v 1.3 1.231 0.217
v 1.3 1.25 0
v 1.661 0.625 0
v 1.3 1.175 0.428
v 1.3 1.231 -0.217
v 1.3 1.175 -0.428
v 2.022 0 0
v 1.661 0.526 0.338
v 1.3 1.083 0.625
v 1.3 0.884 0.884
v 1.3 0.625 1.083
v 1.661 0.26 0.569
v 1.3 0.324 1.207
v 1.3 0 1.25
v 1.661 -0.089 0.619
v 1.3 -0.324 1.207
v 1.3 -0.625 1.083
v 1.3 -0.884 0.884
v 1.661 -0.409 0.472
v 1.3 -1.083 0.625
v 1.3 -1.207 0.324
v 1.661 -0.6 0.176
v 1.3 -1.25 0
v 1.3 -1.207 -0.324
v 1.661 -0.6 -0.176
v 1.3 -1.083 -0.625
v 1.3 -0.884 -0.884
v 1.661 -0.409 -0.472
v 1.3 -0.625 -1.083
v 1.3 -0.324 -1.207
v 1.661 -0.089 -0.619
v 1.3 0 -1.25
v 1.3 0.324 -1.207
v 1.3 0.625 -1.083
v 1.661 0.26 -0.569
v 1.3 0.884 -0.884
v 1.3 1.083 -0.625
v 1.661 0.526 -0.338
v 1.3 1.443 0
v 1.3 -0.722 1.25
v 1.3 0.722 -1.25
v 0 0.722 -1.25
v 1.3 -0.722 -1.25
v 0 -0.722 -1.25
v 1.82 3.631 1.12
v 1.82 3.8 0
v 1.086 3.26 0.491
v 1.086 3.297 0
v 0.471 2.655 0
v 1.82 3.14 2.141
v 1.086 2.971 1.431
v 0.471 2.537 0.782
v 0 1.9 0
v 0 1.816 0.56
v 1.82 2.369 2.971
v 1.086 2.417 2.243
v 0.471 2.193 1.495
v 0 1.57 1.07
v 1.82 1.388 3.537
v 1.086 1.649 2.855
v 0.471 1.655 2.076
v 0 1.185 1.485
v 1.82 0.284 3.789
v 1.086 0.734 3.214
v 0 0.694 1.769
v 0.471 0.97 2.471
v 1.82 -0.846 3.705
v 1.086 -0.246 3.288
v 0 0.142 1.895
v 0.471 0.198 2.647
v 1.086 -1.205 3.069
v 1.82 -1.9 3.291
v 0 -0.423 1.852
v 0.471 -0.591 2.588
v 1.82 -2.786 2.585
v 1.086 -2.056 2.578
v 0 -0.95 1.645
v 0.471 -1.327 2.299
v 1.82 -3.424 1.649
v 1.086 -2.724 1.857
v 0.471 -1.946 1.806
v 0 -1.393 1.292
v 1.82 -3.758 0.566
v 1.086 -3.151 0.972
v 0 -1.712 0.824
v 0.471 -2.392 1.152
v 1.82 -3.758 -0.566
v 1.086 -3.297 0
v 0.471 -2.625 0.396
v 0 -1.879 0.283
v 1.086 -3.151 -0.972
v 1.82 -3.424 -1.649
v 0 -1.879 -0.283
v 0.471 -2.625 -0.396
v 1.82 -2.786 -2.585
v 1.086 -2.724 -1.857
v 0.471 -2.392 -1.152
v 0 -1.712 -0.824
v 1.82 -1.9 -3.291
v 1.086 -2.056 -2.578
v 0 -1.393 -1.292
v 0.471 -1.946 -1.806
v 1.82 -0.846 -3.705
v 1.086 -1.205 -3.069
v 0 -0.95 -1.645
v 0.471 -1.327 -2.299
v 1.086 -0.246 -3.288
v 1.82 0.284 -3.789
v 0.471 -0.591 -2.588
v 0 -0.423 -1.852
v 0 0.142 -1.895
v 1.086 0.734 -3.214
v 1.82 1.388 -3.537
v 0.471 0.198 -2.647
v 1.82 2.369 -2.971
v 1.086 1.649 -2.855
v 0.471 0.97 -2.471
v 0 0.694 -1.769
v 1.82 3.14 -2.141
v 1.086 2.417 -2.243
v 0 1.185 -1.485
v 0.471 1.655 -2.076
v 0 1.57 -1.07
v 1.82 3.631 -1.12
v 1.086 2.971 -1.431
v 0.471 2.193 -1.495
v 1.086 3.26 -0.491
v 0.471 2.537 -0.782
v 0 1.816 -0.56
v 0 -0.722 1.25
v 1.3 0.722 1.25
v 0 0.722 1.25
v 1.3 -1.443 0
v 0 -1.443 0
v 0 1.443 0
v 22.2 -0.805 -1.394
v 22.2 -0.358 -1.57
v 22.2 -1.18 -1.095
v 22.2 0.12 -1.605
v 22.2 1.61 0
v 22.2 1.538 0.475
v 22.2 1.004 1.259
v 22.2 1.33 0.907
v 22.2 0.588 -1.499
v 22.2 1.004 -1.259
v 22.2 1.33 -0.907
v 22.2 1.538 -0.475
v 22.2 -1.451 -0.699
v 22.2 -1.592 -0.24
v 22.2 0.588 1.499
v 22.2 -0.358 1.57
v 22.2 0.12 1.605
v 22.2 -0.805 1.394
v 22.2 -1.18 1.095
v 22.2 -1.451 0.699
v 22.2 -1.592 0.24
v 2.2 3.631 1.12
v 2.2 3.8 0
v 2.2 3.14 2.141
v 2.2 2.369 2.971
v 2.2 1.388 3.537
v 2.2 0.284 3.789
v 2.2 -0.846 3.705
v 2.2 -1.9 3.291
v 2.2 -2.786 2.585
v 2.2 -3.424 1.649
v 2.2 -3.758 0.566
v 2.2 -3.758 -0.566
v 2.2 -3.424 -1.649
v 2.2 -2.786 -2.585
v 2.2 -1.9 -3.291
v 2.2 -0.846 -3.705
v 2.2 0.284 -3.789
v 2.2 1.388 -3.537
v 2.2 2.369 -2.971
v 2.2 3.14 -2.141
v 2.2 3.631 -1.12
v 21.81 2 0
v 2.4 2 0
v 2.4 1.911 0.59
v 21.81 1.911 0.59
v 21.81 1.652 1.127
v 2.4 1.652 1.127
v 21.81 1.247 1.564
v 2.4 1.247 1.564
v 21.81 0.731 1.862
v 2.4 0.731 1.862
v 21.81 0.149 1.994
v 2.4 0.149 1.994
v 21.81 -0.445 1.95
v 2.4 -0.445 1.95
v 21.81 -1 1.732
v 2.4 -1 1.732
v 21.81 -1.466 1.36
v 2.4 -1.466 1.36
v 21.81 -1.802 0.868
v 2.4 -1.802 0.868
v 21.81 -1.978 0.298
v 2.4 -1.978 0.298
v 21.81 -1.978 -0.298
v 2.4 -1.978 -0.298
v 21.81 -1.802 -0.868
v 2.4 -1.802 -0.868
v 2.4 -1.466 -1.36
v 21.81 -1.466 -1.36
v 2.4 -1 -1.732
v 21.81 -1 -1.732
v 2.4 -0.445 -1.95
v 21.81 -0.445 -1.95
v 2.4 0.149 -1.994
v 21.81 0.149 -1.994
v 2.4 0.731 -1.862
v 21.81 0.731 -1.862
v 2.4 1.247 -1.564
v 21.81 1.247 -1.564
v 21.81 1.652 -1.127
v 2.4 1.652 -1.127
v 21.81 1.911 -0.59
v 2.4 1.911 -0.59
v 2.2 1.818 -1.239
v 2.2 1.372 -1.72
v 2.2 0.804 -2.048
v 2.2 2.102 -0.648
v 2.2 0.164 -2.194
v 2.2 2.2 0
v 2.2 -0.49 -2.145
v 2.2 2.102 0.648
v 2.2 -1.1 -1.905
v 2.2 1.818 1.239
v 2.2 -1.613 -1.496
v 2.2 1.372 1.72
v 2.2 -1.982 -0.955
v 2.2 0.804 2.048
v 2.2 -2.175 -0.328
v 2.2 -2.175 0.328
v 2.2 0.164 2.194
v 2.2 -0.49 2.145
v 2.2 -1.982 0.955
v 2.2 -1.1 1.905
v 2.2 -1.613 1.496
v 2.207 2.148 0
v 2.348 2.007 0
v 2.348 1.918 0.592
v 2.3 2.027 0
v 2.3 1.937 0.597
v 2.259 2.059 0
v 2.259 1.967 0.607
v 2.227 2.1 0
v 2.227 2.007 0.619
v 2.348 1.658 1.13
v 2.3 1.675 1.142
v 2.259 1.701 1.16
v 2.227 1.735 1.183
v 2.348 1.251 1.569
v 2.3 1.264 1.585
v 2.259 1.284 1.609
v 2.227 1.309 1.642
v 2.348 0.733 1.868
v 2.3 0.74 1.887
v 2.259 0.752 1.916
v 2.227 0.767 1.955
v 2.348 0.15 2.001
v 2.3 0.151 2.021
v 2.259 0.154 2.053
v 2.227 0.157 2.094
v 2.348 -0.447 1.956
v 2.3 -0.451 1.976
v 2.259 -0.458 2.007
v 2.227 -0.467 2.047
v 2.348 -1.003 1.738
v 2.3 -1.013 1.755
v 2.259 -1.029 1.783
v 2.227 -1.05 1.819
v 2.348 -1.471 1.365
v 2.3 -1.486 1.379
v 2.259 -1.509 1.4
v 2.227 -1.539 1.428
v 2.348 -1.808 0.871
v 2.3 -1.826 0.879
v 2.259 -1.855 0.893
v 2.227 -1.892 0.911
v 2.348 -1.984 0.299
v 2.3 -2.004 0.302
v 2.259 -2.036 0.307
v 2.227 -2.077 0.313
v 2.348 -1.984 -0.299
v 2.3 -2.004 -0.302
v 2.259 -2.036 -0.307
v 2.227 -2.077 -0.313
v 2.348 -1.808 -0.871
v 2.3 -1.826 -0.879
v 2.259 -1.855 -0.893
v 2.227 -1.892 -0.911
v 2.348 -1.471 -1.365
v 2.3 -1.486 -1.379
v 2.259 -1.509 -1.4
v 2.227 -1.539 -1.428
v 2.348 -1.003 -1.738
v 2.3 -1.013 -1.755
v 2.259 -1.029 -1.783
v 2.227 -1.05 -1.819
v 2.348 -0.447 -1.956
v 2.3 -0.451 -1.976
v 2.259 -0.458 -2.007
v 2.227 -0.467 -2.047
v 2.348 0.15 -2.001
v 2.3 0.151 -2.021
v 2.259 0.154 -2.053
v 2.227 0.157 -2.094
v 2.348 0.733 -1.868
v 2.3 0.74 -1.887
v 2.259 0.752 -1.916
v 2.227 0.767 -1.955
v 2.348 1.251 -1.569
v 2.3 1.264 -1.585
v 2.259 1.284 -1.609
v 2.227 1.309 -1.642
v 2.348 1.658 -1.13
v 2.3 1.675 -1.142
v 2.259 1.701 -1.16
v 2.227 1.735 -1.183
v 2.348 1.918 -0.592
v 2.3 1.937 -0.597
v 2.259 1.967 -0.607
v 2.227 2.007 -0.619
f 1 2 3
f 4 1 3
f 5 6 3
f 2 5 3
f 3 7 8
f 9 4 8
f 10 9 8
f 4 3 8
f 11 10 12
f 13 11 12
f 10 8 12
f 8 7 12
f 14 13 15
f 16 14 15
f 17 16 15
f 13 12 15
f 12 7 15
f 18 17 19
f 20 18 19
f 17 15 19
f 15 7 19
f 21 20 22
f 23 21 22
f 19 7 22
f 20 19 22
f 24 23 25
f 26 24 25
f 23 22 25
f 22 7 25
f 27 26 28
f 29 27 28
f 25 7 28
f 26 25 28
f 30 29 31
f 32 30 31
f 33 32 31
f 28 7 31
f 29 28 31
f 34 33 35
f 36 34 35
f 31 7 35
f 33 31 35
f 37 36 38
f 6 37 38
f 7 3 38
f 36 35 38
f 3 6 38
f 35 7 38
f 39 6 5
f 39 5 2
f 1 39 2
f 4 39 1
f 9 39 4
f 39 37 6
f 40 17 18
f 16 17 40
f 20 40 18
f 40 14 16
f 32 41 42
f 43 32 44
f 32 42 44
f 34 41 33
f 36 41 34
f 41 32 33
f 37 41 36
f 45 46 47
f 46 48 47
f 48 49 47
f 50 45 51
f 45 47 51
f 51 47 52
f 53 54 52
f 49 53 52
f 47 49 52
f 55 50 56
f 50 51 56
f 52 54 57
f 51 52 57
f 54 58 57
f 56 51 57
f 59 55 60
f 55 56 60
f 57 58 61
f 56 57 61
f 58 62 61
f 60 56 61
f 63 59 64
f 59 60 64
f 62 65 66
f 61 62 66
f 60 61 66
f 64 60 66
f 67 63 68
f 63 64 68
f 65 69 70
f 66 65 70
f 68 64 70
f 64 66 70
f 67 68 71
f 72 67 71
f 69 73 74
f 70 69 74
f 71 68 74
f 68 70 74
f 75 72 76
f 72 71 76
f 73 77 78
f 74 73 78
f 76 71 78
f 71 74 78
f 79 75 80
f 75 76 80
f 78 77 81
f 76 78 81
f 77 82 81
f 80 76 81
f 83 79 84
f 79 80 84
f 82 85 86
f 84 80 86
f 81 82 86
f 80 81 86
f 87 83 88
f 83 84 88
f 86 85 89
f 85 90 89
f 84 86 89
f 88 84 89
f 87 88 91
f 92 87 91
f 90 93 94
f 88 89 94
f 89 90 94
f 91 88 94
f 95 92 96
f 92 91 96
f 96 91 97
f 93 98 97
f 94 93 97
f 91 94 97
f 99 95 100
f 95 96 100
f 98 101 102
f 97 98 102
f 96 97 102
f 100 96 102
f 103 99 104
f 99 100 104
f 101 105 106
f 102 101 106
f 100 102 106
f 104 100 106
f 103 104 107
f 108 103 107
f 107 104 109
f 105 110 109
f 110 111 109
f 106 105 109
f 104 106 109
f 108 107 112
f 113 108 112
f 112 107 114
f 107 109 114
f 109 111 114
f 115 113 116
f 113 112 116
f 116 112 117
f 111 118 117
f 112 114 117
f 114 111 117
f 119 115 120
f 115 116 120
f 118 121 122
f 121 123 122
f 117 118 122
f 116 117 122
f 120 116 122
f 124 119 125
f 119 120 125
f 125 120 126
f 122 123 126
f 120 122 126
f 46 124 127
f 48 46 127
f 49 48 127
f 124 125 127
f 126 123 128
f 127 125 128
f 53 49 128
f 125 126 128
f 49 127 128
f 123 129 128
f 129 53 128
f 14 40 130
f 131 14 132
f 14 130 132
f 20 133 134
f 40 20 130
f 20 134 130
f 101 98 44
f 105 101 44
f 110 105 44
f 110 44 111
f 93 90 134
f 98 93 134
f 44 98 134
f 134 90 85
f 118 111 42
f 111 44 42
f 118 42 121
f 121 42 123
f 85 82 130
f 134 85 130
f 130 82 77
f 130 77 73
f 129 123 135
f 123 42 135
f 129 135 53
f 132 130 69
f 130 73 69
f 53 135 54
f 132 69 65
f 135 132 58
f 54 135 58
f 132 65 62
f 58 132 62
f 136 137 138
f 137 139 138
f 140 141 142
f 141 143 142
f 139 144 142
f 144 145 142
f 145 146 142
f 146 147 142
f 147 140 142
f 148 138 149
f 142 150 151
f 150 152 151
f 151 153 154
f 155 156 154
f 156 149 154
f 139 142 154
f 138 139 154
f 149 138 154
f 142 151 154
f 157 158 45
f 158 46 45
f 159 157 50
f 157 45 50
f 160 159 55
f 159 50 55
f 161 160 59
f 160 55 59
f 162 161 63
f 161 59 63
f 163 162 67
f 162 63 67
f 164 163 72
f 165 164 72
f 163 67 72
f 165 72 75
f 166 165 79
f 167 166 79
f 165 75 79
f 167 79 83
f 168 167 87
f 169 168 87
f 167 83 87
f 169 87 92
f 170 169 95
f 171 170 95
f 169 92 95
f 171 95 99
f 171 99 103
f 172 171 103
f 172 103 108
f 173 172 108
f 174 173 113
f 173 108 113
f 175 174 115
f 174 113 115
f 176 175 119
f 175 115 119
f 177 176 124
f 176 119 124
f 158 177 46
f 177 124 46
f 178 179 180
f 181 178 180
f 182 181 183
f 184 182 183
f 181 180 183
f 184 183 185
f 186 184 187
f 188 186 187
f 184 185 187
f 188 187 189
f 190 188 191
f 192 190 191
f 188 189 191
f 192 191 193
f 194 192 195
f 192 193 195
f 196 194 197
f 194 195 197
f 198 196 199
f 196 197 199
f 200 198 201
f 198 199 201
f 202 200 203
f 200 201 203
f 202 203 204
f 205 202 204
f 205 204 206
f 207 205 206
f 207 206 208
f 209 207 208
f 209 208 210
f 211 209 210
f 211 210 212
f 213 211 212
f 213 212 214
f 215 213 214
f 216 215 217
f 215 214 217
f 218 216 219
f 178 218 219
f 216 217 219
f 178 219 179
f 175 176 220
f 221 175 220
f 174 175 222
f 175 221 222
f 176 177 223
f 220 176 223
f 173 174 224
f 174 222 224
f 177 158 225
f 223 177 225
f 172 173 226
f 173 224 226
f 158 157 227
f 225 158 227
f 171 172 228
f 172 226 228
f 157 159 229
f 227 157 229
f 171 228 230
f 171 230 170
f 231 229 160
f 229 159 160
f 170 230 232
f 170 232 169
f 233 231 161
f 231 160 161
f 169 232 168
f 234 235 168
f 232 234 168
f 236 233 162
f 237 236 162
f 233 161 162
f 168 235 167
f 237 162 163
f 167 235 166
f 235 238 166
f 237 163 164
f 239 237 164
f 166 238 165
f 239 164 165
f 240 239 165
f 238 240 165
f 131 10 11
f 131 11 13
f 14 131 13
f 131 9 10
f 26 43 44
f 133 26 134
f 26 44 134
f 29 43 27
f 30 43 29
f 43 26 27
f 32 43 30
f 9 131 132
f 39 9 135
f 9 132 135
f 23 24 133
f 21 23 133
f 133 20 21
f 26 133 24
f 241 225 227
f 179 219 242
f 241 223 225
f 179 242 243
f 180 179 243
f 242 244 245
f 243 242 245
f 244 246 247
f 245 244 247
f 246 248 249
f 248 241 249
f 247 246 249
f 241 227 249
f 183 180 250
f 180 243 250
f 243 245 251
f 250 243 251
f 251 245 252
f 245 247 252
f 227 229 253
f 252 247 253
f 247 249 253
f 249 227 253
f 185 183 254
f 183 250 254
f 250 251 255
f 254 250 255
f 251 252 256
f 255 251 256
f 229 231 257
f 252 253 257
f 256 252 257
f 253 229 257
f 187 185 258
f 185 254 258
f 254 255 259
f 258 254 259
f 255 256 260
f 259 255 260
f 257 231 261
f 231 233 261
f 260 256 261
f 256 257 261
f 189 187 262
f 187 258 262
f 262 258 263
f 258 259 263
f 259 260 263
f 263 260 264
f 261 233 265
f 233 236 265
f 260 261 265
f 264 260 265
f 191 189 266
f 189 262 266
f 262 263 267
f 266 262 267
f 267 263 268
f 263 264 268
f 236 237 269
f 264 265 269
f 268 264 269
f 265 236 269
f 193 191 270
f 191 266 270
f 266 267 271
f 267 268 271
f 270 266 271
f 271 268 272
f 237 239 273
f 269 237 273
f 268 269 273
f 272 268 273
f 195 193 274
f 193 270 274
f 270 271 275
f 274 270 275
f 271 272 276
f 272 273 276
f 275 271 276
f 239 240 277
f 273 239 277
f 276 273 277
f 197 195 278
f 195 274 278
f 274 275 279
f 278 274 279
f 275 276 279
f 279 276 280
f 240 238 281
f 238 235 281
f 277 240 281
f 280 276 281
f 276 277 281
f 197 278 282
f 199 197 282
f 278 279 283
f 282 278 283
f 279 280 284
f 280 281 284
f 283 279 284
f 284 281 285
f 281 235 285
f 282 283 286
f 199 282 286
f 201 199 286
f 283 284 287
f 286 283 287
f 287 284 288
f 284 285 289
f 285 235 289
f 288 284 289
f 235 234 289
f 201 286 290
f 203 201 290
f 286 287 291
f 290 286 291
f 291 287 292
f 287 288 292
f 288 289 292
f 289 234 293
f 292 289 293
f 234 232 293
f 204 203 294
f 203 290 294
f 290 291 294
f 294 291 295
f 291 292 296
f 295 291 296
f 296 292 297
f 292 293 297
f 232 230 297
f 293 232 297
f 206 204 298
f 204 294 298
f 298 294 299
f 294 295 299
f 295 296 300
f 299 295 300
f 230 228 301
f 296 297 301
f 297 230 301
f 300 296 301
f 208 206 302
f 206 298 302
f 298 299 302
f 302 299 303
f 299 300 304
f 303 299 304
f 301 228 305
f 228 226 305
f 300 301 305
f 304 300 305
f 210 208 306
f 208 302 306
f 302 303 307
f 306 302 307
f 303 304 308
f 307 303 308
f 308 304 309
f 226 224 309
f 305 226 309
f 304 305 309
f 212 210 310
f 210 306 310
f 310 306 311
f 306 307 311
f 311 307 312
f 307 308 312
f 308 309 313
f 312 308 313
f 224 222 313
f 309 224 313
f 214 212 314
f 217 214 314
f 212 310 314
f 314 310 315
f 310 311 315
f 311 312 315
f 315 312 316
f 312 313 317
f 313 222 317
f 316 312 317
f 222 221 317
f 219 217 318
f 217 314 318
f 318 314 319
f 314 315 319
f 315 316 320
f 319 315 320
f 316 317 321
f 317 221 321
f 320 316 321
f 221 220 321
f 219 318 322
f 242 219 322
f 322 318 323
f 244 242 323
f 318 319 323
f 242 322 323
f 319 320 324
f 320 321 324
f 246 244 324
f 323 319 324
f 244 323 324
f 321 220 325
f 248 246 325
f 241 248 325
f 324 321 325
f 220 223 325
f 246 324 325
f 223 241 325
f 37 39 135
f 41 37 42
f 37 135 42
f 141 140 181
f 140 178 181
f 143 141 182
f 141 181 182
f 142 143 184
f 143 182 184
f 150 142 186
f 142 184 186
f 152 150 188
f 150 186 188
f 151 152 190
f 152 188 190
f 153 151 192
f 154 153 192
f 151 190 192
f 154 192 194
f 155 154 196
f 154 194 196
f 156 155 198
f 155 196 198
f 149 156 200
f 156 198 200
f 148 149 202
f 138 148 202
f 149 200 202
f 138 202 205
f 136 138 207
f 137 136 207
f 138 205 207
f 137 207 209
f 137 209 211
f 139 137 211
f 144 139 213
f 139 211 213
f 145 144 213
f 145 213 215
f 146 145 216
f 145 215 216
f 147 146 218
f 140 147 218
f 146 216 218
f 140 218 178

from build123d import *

# Parameters (mm, degrees)
FILLET1_R   = 0.2
HEX_2_DEPTH = 1.3


with BuildPart() as part:
    # BodySke → BaseBody (revolve)
    with BuildSketch(Plane.XY):
        with BuildLine():
            Line((22.2, 0), (22.2, 1.61))
            Line((22.2, 1.61), (21.81, 2))
            Line((21.81, 2), (2.2, 2))
            Line((2.2, 2), (2.2, 3.8))
            Line((2.2, 3.8), (1.82, 3.8))
            ThreePointArc((1.82, 3.8), (0.762013659, 2.991755338), (0, 1.9))
            Line((0, 1.9), (0, 0))
            Line((0, 0), (22.2, 0))
        make_face()
    revolve(axis=Axis((0, 0, 0), (1, 0, 0)))

    # Fillet1
    fillet1_edges = [part.edges().sort_by_distance(p)[0] for p in [
        (2.2, -2, 0),
    ]]
    fillet(fillet1_edges, radius=FILLET1_R)

    # Sketch2 → PreBroach (revolve, cut)
    with BuildSketch(Plane.XY):
        Polygon((0, 1.25), (1.3, 1.25), (2.021687836, 0), (0, 0), align=None)
    revolve(axis=Axis((0, 0, 0), (1, 0, 0)), mode=Mode.SUBTRACT)

    # Sketch3 → Hex 2 (cut)
    with BuildSketch(Plane(origin=(0, 0, 0), x_dir=(0, 0, -1), z_dir=(1, 0, 0))):
        Polygon((-1.25, -0.721687836), (-1.25, 0.721687836), (0, 1.443375673), (1.25, 0.721687836), (1.25, -0.721687836), (0, -1.443375673), align=None)
    extrude(amount=HEX_2_DEPTH, mode=Mode.SUBTRACT)


solid = part.part
